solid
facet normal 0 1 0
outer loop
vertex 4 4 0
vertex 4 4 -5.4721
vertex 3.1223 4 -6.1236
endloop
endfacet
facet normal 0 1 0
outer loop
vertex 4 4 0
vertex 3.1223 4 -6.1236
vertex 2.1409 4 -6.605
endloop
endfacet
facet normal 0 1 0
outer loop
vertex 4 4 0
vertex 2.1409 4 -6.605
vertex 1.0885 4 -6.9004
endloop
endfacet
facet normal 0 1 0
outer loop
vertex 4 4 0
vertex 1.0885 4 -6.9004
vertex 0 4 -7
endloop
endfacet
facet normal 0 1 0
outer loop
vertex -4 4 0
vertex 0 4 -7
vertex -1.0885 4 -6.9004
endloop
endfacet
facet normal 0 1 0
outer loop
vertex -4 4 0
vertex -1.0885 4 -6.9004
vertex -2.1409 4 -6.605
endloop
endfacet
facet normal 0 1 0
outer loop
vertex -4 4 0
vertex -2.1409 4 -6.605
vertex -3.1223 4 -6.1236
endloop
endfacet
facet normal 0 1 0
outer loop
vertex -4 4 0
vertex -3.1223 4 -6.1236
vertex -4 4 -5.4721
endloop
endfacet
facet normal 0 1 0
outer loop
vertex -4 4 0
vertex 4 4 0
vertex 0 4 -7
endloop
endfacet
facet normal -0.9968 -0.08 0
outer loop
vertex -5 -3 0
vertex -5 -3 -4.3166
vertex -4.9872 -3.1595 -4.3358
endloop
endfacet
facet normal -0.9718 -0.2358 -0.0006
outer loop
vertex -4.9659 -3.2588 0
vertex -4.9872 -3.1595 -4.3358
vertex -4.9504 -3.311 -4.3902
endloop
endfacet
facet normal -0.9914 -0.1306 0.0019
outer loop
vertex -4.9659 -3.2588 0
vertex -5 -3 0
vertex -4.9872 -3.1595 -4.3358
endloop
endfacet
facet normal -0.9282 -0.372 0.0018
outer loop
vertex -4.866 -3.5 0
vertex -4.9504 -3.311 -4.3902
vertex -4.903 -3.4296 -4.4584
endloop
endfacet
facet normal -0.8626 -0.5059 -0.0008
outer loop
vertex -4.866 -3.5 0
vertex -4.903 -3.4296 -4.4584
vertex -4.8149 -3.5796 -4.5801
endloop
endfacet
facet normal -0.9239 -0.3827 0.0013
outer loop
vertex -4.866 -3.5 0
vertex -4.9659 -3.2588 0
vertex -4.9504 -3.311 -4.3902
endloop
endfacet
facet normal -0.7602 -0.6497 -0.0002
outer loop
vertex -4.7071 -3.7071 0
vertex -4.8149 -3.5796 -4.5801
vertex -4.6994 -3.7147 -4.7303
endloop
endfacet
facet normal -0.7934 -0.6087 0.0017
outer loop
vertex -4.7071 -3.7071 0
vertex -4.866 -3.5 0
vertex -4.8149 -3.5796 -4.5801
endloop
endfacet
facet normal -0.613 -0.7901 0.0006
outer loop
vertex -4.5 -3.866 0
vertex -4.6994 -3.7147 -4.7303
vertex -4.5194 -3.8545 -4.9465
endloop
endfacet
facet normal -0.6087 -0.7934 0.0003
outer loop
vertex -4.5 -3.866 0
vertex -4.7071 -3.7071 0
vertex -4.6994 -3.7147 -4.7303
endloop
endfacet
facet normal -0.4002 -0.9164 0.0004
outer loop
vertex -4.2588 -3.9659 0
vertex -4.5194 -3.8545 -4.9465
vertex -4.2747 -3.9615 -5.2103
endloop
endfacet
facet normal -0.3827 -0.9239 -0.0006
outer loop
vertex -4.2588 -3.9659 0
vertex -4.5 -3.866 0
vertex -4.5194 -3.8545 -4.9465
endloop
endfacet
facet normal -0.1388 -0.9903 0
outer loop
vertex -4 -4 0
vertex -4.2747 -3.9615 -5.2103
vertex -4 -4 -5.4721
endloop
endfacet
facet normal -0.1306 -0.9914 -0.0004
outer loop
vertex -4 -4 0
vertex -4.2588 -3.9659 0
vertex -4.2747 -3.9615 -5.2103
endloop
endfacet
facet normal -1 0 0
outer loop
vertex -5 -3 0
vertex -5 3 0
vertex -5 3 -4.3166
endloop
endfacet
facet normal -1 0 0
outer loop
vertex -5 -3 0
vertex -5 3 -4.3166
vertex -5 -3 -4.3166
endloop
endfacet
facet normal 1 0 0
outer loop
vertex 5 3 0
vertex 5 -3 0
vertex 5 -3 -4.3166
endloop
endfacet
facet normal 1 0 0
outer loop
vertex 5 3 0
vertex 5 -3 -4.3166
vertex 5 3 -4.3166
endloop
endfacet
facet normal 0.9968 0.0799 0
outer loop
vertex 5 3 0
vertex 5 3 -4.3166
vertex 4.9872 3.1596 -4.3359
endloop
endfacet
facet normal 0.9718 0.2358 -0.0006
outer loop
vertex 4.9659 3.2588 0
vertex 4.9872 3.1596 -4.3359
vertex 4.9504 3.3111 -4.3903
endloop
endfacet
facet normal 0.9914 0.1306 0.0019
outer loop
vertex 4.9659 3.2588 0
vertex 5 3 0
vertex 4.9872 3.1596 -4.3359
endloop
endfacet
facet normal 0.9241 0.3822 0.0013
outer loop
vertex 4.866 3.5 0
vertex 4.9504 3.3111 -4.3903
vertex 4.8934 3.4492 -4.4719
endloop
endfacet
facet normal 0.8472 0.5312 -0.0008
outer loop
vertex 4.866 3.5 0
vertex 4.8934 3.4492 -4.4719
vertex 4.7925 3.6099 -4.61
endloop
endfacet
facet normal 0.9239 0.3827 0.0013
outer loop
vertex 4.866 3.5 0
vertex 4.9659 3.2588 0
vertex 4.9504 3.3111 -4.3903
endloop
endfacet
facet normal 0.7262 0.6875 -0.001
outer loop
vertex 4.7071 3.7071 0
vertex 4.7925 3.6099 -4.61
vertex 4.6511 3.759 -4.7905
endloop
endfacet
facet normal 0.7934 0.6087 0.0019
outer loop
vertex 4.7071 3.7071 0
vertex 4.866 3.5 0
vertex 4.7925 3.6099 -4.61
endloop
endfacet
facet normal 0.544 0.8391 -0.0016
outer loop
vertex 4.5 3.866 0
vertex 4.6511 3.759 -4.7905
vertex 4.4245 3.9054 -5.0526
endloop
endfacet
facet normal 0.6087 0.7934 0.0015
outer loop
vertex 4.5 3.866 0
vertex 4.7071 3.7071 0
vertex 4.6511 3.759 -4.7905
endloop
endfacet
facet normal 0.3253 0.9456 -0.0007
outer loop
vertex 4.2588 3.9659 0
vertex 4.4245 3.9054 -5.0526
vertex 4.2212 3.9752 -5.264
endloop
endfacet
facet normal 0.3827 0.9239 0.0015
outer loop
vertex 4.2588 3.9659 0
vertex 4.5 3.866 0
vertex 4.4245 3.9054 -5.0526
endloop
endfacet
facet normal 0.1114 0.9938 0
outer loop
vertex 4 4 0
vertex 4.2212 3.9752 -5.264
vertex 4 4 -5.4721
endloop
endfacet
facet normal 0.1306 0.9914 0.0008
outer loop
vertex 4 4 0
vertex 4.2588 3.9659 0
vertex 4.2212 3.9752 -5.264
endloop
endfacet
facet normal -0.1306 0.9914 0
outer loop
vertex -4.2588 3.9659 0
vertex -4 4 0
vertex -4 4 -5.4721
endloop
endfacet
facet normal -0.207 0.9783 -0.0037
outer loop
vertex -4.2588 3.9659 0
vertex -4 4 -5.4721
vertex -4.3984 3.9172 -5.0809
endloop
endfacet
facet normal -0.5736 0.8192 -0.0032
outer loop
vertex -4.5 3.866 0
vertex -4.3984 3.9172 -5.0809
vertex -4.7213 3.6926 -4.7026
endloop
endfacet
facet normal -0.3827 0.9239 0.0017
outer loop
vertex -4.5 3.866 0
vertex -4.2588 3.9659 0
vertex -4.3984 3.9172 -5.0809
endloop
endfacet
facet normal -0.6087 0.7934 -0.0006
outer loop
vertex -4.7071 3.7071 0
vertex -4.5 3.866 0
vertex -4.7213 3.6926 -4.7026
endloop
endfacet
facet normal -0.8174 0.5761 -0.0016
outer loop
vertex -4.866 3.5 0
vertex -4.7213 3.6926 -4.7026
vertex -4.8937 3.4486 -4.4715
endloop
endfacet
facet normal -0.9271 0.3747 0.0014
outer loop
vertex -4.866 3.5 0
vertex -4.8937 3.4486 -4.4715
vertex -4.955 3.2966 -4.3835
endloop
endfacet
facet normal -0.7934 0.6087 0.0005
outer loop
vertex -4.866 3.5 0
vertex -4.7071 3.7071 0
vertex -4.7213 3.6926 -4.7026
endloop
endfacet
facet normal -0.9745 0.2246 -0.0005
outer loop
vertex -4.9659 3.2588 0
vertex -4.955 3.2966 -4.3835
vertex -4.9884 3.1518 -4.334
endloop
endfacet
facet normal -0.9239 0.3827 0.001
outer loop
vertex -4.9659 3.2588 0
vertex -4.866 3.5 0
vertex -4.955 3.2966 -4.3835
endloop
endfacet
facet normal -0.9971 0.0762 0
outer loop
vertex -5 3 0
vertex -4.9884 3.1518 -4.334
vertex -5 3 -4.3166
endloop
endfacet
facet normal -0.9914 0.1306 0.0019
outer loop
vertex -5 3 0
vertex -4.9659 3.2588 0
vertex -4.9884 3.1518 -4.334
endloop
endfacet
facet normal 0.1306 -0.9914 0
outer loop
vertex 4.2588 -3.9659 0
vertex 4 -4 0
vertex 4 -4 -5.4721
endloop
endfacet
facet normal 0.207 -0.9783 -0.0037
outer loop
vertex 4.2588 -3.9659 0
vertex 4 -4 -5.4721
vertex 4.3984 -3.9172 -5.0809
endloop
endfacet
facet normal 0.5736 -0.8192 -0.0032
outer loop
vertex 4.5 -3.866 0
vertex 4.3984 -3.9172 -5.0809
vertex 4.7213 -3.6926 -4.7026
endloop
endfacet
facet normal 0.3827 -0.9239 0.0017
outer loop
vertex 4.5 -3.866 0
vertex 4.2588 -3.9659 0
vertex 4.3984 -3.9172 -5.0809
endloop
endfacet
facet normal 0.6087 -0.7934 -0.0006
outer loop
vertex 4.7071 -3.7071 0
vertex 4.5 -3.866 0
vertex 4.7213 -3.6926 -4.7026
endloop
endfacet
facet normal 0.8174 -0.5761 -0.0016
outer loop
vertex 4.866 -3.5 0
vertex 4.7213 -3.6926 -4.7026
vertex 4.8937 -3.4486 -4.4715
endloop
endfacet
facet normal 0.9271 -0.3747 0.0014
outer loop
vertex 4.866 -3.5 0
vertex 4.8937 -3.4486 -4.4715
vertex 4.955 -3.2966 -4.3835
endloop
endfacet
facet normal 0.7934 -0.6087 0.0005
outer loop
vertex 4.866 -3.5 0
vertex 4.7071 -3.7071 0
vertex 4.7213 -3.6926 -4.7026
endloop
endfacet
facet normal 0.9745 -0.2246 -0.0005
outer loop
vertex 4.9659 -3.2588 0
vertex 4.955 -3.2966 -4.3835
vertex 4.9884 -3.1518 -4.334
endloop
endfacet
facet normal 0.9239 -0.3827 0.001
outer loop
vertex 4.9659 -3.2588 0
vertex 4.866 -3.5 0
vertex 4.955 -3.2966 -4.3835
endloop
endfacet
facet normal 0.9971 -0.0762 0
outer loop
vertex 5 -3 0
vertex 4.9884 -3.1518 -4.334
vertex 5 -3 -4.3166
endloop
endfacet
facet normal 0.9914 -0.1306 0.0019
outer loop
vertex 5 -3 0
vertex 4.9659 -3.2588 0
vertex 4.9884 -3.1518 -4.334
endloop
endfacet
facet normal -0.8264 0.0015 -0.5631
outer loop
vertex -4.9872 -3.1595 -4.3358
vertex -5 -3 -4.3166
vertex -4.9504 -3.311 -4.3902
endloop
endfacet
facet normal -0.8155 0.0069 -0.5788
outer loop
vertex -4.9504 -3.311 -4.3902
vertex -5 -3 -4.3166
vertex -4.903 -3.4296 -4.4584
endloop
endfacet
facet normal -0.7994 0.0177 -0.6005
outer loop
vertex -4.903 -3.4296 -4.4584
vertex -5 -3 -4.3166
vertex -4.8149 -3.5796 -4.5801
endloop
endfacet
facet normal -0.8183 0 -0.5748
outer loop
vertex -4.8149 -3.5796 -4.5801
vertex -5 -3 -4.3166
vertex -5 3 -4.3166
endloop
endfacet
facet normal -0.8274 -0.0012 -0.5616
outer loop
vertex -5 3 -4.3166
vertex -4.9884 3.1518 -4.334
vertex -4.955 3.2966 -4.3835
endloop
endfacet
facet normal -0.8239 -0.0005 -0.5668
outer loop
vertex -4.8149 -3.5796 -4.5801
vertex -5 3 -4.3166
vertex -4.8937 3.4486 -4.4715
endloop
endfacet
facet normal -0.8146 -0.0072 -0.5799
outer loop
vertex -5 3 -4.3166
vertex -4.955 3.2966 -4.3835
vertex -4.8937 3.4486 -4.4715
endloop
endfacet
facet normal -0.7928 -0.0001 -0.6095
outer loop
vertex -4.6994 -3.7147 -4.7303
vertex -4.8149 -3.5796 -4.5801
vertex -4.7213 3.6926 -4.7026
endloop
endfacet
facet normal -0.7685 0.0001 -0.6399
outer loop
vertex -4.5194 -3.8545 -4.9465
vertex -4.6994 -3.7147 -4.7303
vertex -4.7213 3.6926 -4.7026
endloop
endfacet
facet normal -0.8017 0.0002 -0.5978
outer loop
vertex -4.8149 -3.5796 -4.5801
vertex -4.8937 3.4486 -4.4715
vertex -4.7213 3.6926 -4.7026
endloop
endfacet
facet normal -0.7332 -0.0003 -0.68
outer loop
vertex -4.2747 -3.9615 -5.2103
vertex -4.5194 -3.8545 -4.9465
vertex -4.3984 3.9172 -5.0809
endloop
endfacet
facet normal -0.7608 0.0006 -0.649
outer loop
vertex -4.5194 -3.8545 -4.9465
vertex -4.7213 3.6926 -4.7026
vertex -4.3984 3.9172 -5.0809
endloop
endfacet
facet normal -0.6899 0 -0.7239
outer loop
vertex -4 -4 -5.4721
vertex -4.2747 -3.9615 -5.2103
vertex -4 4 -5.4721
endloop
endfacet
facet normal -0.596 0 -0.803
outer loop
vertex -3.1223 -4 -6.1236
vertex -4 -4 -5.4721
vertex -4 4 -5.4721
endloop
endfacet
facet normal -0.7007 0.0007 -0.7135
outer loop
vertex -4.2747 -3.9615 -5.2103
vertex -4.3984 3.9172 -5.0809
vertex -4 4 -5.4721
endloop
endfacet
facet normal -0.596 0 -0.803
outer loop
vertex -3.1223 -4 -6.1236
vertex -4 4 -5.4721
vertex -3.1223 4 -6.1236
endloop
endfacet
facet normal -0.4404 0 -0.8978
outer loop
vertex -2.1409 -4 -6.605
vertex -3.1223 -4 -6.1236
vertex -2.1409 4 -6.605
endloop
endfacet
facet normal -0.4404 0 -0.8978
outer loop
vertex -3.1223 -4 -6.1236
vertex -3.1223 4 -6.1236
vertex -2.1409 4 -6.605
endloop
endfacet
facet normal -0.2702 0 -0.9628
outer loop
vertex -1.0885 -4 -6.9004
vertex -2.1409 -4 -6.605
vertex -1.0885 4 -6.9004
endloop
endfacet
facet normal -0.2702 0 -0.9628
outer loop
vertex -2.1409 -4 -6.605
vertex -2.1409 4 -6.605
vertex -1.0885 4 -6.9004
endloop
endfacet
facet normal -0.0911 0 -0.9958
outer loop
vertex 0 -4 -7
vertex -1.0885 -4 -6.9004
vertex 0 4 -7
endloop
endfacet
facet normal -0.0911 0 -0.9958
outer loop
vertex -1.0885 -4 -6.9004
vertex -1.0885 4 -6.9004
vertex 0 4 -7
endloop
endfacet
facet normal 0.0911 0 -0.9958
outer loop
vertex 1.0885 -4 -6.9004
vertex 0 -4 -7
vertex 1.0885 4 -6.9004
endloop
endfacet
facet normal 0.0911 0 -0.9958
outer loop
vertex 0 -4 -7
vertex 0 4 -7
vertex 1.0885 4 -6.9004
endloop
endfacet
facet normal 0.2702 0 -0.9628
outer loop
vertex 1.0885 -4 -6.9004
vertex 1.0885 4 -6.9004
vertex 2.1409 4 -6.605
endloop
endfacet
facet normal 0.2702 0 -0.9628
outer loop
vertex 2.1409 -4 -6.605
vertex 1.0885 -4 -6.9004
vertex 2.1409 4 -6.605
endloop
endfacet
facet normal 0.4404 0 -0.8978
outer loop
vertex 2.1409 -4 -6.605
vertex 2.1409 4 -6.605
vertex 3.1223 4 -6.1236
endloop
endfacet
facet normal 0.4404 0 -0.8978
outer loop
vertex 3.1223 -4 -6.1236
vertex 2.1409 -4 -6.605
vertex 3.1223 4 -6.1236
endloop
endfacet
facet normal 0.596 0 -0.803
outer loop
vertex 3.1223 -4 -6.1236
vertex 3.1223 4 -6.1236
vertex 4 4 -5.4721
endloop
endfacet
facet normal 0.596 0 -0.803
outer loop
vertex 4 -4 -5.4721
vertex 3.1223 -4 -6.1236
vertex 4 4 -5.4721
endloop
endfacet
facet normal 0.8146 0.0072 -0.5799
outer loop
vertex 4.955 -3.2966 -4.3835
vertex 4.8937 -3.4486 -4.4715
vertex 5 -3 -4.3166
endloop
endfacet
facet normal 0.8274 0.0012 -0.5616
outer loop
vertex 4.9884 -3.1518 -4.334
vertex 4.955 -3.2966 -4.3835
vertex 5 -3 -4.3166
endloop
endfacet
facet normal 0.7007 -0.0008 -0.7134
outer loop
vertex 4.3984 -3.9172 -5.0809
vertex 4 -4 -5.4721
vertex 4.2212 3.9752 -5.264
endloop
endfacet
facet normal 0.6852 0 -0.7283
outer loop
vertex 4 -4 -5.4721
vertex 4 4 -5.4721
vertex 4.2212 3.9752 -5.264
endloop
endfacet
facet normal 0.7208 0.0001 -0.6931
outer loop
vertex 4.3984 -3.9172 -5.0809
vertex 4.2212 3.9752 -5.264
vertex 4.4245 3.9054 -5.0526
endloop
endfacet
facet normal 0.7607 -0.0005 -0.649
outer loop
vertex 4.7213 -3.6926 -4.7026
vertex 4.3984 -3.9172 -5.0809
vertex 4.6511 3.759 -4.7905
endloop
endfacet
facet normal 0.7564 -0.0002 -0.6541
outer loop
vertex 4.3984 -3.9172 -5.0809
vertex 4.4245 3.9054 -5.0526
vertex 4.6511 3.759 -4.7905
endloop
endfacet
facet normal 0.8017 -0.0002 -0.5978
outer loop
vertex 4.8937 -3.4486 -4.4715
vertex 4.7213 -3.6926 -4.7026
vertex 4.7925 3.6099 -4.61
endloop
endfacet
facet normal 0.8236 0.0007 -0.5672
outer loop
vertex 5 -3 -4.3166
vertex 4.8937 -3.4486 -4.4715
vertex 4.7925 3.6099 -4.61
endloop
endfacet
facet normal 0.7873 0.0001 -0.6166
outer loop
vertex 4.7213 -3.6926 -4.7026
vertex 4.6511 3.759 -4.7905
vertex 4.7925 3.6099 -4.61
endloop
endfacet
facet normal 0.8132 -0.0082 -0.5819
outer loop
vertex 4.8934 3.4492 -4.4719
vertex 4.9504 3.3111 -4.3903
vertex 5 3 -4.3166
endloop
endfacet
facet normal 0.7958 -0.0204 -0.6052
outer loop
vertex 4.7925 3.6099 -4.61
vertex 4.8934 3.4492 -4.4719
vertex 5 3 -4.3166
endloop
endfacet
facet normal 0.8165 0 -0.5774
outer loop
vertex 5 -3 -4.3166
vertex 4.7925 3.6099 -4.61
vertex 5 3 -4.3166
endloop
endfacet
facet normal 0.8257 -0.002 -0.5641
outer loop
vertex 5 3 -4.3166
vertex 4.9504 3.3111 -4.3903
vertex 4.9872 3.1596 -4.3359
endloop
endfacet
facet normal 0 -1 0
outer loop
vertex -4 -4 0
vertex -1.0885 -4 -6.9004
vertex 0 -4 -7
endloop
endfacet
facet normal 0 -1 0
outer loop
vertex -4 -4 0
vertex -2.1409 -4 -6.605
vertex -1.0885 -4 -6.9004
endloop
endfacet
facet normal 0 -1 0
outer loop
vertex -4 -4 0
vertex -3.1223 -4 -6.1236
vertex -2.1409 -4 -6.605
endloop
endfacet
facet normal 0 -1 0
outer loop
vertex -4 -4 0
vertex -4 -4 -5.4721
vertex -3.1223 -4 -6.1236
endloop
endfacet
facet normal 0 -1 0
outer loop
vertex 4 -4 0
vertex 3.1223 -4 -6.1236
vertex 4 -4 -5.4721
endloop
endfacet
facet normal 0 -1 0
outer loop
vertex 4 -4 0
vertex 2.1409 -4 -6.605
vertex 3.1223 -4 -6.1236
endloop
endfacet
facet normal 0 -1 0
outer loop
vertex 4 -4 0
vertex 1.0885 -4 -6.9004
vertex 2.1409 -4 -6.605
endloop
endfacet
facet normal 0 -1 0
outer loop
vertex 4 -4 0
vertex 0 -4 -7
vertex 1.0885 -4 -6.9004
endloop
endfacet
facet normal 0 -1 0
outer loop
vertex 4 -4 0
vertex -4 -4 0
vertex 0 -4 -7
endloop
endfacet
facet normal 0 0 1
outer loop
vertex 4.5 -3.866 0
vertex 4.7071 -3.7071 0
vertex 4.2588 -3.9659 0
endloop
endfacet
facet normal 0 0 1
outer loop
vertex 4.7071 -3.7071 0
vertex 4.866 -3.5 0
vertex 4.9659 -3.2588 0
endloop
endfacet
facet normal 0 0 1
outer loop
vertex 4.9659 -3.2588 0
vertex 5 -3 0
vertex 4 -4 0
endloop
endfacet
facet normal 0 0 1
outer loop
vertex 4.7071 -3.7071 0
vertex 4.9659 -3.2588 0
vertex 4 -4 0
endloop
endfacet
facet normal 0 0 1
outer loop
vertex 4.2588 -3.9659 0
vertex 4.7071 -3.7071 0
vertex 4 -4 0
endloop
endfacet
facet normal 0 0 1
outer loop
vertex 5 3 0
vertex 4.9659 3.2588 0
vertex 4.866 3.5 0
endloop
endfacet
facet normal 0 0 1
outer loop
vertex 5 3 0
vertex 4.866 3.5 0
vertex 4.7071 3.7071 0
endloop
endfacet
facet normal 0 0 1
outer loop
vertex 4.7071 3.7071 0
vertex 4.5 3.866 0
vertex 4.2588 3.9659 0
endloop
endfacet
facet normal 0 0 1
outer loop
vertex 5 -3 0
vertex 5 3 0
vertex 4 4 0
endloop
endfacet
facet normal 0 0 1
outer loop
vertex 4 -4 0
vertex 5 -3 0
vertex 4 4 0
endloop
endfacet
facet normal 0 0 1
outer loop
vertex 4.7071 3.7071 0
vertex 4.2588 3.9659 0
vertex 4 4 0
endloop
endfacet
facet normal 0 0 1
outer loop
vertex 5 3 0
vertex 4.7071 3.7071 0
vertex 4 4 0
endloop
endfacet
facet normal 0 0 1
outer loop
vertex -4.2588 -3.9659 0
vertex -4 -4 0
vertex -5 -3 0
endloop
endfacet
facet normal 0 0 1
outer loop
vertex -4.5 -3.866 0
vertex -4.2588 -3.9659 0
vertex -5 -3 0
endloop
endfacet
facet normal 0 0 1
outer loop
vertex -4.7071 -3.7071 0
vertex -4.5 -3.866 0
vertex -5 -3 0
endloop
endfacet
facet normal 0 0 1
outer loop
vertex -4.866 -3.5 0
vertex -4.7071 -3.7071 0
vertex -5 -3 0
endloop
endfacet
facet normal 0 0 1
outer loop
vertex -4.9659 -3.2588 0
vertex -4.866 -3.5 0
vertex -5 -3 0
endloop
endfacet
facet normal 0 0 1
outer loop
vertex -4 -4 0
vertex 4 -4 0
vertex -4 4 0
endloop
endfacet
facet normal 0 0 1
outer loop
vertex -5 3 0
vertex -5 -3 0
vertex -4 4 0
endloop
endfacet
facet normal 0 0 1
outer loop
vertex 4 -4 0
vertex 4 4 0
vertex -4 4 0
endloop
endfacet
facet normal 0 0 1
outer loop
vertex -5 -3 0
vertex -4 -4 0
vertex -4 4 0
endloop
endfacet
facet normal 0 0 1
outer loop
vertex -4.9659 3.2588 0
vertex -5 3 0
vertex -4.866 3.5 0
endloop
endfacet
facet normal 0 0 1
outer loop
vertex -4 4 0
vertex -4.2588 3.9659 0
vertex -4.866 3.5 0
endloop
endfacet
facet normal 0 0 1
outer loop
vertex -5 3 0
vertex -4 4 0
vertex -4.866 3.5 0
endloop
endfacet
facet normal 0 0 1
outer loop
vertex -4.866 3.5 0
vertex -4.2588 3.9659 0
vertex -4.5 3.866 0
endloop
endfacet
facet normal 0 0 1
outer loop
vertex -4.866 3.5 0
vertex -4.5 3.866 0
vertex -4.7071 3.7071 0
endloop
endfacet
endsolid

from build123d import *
from build123d.topology import SkipClean

# Parameters (mm, degrees)
SALIENTE_EXTRUIR1_DEPTH = 1
SALIENTE_EXTRUIR2_DEPTH = 7
CROQUIS4_W              = 21.763285414
CROQUIS4_H              = 20.505608116
CORTAR_EXTRUIR1_DEPTH   = 14


with BuildPart() as part:
    # Croquis1 → Saliente-Extruir1 (new body)
    with BuildSketch(Plane.XY):
        with BuildLine():
            Line((-4, 4), (4, 4))
            ThreePointArc((4, 4), (4.707106781, 3.707106781), (5, 3))
            Line((5, 3), (5, -3))
            ThreePointArc((5, -3), (4.707106781, -3.707106781), (4, -4))
            Line((4, -4), (-4, -4))
            ThreePointArc((-4, -4), (-4.707106781, -3.707106781), (-5, -3))
            Line((-5, -3), (-5, 3))
            ThreePointArc((-5, 3), (-4.707106781, 3.707106781), (-4, 4))
        make_face()
    extrude(amount=-SALIENTE_EXTRUIR1_DEPTH)

    # Croquis2 → Saliente-Extruir2 (add, symmetric)
    with BuildSketch(Plane(origin=(0, 0, 0), x_dir=(1, 0, 0), z_dir=(0, 1, 0))):
        with BuildLine():
            Line((0, 1), (-6, 1))
            ThreePointArc((-6, 1), (-4.242640667, 5.242640684), (0, 7))
            ThreePointArc((0, 7), (4.242640687, 5.242640687), (6, 1))
            Line((6, 1), (0, 1))
        make_face()
    extrude(amount=SALIENTE_EXTRUIR2_DEPTH, both=True)

    # Croquis4 → Cortar-Extruir1 (cut)
    with SkipClean():  # the faces are left unmerged after this step: merging them gives an invalid solid
        with BuildSketch(Plane.XY):
            with Locations((0.374231366, -0.207273628)):
                Rectangle(CROQUIS4_W, CROQUIS4_H)
            with BuildLine():
                Line((5, -3), (5, 3))
                ThreePointArc((5, 3), (4.707106781, 3.707106781), (4, 4))
                Line((4, 4), (-4, 4))
                ThreePointArc((-4, 4), (-4.707106781, 3.707106781), (-5, 3))
                Line((-5, 3), (-5, -3))
                ThreePointArc((-5, -3), (-4.707106781, -3.707106781), (-4, -4))
                Line((-4, -4), (4, -4))
                ThreePointArc((4, -4), (4.707106781, -3.707106781), (5, -3))
            make_face(mode=Mode.SUBTRACT)
        extrude(amount=-CORTAR_EXTRUIR1_DEPTH, mode=Mode.SUBTRACT)
    add(part.part.scale(1), mode=Mode.REPLACE)  # the faces are merged on a copy


solid = part.part
